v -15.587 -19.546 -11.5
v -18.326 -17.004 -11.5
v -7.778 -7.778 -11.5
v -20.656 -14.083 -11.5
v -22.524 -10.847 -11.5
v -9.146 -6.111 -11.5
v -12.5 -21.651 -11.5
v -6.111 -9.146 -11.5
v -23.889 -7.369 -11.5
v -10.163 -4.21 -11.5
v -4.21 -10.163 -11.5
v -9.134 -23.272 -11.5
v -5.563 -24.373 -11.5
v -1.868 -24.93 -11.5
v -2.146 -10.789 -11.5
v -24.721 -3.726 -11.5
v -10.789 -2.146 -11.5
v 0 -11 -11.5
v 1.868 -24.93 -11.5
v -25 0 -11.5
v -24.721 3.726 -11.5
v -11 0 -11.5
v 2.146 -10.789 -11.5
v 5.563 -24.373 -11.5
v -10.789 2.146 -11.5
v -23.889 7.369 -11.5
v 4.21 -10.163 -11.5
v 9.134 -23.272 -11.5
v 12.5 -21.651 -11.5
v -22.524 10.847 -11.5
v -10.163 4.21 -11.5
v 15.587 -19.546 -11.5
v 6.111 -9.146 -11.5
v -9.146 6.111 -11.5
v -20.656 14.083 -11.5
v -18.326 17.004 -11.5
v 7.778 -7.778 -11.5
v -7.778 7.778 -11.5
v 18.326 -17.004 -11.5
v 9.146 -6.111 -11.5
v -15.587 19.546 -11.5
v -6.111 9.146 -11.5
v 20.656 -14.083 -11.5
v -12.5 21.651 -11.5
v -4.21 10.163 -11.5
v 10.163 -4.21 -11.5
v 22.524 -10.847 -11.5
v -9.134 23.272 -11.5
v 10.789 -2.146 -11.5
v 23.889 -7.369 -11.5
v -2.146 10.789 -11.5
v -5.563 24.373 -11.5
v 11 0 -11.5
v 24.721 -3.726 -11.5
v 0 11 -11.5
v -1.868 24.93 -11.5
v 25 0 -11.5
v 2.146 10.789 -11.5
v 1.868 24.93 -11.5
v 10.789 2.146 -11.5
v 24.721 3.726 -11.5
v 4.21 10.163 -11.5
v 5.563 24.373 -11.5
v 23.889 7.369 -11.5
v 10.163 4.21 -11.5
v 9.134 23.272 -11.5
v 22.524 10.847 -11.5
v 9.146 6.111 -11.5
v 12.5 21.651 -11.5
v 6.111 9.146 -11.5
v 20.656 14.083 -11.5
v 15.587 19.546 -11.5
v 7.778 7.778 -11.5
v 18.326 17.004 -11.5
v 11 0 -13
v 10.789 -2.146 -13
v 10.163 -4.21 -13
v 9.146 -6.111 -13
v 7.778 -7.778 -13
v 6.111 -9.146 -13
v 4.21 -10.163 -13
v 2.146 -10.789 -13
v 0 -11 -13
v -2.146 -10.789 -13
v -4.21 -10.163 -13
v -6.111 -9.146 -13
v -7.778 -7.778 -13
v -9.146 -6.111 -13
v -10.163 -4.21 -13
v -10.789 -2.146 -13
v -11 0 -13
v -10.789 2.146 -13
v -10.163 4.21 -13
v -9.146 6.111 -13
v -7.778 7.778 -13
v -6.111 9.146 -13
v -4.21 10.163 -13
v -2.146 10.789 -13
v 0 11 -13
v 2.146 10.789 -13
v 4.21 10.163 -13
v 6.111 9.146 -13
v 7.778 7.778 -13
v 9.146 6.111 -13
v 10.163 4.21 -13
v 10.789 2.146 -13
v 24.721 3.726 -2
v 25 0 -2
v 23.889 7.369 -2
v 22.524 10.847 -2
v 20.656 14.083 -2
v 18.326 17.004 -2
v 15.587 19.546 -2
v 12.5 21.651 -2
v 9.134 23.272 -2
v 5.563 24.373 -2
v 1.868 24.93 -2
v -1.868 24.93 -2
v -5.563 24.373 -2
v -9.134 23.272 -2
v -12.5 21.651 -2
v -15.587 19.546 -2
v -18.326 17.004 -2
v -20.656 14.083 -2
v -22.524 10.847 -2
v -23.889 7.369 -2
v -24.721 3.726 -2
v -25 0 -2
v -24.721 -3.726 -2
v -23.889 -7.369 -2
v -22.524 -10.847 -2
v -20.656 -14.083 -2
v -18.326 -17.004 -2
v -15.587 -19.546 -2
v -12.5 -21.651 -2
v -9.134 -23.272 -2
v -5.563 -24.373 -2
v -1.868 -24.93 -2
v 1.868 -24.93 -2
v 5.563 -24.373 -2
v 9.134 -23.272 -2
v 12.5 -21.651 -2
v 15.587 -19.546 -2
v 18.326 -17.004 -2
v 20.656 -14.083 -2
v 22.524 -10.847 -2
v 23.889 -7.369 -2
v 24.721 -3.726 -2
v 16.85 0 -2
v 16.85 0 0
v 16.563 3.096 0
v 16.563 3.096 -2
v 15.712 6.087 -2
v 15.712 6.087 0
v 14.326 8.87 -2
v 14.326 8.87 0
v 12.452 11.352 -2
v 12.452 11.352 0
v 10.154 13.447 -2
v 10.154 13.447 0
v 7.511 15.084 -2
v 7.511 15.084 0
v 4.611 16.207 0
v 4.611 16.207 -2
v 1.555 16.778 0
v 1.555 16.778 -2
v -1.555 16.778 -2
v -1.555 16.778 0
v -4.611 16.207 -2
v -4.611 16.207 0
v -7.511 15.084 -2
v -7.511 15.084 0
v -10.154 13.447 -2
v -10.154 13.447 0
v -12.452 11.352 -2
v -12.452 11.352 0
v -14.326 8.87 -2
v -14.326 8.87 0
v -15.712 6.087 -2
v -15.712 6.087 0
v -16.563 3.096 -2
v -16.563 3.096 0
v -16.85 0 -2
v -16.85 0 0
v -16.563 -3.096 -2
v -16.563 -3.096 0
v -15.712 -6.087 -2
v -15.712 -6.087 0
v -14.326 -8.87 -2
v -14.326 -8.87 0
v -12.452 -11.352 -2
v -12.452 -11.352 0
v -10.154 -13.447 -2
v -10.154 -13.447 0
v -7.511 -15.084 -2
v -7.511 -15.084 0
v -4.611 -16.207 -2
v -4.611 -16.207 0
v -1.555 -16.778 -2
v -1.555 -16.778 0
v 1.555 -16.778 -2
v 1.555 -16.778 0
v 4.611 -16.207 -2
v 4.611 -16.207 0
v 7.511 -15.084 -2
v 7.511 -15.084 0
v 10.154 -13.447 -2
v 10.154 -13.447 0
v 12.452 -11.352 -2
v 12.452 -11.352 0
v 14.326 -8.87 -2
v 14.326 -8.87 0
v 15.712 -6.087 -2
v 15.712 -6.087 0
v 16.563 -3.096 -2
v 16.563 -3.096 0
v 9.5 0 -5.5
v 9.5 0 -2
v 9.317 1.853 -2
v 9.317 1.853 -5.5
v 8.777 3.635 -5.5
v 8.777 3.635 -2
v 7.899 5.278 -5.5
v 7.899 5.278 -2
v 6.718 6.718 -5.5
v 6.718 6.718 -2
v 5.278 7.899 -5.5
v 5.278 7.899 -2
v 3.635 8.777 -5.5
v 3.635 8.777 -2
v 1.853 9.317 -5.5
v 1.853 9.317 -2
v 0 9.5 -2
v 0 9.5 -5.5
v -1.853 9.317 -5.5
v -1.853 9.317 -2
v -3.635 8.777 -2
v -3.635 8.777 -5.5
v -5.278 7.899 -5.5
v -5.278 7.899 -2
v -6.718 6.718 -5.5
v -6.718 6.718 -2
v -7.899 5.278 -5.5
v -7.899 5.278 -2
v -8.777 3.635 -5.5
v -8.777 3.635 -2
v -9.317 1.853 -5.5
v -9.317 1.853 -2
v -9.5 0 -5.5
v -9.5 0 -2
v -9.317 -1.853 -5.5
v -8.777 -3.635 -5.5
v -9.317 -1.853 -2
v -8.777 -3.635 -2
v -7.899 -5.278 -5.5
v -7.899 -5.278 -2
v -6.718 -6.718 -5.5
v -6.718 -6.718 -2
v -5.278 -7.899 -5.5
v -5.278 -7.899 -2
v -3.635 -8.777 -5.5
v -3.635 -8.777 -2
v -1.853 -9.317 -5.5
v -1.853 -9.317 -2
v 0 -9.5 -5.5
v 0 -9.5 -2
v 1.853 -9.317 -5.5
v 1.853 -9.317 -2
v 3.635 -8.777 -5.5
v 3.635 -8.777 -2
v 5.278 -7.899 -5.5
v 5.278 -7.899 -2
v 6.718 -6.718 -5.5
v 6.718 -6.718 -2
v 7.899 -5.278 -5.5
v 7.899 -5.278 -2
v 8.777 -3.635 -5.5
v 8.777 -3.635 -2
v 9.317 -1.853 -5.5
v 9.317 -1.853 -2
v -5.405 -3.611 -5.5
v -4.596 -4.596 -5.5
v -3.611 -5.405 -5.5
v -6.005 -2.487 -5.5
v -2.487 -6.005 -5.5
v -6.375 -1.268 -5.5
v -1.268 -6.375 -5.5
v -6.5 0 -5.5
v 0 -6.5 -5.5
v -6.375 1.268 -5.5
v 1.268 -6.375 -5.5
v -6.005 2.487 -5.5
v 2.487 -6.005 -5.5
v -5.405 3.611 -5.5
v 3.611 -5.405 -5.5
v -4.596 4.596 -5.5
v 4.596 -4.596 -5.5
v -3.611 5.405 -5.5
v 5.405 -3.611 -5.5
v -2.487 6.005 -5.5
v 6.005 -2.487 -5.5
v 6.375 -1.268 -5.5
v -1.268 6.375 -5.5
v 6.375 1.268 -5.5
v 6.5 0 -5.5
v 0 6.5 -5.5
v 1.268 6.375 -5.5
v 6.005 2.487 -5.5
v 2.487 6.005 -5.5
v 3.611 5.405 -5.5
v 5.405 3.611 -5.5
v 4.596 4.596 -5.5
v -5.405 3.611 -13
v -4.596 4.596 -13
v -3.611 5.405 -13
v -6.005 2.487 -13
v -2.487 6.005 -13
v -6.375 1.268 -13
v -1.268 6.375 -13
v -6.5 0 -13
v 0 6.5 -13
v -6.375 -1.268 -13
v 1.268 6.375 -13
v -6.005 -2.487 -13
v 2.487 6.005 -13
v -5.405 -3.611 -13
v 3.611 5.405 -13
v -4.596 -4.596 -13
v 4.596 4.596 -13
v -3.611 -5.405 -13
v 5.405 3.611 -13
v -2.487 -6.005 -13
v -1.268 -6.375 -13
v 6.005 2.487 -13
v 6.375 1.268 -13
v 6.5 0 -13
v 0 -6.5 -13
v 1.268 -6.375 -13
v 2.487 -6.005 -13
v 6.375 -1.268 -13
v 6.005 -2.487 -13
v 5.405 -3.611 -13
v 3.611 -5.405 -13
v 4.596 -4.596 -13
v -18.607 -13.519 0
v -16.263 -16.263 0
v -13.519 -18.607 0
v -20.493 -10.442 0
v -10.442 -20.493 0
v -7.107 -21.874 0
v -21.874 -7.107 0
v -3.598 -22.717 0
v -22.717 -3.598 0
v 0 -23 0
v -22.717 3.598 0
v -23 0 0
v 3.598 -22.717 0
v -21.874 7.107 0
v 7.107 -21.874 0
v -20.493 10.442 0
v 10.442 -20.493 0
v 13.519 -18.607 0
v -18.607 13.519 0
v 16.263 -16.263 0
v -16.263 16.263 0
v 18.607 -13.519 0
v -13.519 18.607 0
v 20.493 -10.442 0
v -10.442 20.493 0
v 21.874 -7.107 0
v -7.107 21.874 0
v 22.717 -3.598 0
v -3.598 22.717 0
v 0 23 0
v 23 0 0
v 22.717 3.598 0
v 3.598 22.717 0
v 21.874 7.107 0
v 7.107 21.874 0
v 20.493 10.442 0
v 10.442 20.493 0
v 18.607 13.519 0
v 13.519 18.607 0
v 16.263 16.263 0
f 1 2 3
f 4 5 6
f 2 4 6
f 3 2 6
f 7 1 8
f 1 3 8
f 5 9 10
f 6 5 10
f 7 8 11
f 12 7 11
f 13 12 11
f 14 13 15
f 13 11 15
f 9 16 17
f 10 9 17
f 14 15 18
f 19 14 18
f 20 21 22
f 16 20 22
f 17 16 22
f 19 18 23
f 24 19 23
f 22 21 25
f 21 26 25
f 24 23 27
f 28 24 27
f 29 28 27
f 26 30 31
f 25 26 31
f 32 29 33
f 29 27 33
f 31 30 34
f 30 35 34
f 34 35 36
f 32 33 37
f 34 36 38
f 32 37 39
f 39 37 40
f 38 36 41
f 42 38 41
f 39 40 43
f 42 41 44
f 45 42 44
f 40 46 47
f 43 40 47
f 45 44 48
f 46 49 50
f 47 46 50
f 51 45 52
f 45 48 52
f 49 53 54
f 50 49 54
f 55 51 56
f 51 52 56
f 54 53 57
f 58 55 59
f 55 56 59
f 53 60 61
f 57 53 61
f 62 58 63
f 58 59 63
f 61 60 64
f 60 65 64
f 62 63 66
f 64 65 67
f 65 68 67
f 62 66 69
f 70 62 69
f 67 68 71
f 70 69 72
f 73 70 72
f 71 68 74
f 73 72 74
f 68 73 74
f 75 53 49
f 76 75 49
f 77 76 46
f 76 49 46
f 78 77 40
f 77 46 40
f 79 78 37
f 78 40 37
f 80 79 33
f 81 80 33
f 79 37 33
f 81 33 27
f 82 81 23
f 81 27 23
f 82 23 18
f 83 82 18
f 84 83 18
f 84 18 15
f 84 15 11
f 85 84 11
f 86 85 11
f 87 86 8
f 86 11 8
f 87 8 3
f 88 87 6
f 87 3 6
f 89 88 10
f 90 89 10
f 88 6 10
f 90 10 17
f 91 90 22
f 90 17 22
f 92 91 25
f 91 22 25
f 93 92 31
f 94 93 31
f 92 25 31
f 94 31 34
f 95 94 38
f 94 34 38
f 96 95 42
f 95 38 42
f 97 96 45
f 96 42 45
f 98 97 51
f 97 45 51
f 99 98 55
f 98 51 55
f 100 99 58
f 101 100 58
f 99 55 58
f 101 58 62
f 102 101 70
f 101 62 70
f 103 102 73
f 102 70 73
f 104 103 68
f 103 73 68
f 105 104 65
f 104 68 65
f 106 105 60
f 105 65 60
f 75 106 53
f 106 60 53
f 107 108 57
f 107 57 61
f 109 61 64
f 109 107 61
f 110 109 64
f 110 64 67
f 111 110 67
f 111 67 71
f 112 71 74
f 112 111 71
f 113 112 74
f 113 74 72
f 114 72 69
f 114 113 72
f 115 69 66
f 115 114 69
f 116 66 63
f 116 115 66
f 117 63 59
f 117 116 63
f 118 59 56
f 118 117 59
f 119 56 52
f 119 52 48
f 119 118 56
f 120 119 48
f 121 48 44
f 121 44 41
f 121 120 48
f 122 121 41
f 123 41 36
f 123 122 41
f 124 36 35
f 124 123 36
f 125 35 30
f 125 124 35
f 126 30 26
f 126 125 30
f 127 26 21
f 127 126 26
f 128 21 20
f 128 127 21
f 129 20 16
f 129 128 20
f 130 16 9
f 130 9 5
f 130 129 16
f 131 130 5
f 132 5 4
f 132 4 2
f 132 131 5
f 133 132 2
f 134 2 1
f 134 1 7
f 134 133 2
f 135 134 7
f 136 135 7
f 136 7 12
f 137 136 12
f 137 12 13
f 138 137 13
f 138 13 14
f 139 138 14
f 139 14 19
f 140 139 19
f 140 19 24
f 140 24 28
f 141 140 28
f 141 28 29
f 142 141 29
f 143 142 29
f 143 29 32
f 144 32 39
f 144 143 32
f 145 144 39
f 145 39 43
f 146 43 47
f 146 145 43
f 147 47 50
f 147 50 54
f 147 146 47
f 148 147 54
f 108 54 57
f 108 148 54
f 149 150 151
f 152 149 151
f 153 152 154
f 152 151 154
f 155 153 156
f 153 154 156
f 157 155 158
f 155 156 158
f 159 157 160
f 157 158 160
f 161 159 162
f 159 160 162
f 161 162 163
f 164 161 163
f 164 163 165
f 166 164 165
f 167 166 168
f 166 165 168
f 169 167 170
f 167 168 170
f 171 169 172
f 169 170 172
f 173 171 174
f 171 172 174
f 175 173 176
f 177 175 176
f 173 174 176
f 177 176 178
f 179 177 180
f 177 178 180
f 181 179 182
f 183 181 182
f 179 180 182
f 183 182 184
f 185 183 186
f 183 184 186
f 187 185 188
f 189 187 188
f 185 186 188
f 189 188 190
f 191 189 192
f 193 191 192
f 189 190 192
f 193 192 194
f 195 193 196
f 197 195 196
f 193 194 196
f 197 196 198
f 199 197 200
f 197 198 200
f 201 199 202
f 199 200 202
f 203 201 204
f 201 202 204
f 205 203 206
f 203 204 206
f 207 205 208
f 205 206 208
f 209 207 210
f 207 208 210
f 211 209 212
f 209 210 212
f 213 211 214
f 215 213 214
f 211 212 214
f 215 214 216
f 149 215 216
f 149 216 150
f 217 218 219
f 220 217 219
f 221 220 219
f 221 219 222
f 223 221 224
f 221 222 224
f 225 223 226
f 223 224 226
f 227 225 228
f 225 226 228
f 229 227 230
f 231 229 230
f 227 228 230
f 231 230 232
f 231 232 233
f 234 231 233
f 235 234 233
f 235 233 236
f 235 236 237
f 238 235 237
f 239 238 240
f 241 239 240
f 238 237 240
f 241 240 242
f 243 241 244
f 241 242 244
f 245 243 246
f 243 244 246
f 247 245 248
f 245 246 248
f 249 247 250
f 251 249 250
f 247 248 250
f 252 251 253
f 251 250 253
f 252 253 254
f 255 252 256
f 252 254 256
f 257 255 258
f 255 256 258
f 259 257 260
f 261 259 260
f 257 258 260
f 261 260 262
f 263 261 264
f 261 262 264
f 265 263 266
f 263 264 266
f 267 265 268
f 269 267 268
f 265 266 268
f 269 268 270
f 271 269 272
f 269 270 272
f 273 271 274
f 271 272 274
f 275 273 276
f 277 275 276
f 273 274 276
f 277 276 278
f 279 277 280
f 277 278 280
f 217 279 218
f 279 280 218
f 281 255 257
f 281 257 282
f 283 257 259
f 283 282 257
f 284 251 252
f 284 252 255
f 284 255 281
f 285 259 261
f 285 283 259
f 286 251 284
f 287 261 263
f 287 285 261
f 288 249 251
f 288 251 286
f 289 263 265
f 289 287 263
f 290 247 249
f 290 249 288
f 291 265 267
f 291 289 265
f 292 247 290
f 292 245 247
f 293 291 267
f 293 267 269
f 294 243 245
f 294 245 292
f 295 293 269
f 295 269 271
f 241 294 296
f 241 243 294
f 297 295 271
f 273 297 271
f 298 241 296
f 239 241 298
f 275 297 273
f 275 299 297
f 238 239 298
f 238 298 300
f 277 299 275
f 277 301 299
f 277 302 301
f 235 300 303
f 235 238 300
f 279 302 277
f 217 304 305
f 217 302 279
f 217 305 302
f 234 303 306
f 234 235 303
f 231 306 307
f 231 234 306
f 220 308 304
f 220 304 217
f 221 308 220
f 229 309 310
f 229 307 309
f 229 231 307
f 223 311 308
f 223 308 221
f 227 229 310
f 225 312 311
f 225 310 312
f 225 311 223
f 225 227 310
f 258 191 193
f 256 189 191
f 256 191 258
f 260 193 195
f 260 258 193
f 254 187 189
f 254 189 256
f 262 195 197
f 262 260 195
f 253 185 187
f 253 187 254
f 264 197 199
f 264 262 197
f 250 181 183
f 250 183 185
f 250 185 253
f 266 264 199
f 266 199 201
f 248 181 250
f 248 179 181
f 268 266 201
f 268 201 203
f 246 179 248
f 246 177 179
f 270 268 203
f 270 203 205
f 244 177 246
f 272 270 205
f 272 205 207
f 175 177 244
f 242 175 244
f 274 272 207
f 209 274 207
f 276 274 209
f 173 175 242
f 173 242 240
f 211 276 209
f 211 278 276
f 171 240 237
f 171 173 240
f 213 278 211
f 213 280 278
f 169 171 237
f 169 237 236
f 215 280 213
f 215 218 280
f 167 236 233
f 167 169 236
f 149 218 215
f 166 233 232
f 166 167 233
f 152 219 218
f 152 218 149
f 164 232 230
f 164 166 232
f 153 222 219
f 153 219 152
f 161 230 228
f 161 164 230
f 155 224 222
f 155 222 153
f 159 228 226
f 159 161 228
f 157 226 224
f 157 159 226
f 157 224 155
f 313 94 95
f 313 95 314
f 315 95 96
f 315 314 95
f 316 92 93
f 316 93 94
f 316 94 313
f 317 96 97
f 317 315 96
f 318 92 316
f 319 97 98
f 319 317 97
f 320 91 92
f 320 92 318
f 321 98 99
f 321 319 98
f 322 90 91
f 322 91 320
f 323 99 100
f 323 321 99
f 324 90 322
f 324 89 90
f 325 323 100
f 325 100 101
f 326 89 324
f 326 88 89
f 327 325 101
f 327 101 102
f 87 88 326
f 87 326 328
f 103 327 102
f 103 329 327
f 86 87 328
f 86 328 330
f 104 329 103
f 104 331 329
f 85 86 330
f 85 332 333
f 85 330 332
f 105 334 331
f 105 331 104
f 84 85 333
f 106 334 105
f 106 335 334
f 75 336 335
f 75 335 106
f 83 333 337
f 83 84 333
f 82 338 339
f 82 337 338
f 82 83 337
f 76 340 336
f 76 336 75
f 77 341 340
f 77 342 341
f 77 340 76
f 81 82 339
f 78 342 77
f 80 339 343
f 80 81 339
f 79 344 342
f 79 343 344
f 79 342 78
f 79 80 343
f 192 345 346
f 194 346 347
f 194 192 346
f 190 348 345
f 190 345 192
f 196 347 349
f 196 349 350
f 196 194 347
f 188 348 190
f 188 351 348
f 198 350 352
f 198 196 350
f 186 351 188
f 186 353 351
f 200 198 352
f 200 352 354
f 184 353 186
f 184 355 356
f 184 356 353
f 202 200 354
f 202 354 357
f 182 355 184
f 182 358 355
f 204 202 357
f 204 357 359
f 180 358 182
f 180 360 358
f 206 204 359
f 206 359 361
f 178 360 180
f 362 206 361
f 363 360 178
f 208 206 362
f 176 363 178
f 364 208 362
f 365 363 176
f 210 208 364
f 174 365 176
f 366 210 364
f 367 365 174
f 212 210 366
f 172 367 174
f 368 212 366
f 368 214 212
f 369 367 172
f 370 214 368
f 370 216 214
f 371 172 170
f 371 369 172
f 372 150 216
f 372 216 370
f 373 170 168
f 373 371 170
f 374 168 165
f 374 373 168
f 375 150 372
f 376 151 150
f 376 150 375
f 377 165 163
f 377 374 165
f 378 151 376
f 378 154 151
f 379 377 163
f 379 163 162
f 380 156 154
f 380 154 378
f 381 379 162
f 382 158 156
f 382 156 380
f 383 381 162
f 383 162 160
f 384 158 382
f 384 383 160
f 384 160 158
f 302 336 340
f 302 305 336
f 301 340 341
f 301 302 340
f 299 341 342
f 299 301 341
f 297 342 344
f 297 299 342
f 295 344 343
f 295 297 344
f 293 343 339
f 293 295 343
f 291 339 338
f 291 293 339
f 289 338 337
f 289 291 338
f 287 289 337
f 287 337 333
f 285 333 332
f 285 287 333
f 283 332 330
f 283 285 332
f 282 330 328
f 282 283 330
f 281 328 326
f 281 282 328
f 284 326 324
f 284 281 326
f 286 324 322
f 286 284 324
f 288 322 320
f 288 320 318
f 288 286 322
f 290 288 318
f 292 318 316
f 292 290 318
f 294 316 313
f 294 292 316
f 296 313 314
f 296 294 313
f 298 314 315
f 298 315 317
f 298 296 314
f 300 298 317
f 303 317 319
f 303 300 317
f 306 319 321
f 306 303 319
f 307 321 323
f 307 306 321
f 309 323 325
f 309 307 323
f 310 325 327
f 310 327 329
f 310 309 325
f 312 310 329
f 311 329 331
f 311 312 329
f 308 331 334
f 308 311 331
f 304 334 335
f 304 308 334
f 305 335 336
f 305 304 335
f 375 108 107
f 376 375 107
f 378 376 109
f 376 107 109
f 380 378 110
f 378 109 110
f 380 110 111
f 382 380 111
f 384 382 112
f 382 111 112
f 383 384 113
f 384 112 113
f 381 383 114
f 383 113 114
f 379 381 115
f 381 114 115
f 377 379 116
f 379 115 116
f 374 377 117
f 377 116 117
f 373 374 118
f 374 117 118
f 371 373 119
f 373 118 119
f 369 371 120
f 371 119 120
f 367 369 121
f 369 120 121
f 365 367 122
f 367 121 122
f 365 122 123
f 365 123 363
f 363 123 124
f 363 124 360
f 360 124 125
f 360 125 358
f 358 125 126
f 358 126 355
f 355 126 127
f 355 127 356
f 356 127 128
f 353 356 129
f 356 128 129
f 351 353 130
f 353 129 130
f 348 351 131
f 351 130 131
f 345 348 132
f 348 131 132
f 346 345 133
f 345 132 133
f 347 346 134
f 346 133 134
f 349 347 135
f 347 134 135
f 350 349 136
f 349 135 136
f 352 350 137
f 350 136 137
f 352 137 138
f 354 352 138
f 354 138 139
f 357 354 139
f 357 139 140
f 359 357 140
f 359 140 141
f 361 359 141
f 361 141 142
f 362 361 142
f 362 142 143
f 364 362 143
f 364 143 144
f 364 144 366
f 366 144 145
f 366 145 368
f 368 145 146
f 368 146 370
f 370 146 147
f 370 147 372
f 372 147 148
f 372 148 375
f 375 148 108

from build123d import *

# Parameters (mm, degrees)
CROQUIS1_R              = 25
SALIENTE_EXTRUIR1_DEPTH = 11.5
CROQUIS2_R              = 16.85
CORTAR_EXTRUIR1_DEPTH   = 2
CROQUIS3_R              = 9.5
CORTAR_EXTRUIR2_DEPTH   = 3.5
CORTAR_EXTRUIR3_REACH   = 37.861
CROQUIS4_R              = 6.5
CROQUIS5_R              = 11
CROQUIS5_R_2            = 6.5
SALIENTE_EXTRUIR2_DEPTH = 1.5
CHAFL_N1_SIZE           = 2


with BuildPart() as part:
    # Croquis1 → Saliente-Extruir1 (new body)
    with BuildSketch(Plane.XY):
        Circle(CROQUIS1_R)
    extrude(amount=-SALIENTE_EXTRUIR1_DEPTH)

    # Croquis2 → Cortar-Extruir1 (cut)
    with BuildSketch(Plane.XY):
        Circle(CROQUIS2_R)
    extrude(amount=-CORTAR_EXTRUIR1_DEPTH, mode=Mode.SUBTRACT)

    # Croquis3 → Cortar-Extruir2 (cut)
    with BuildSketch(Plane.XY.offset(-2)):
        Circle(CROQUIS3_R)
    extrude(amount=-CORTAR_EXTRUIR2_DEPTH, mode=Mode.SUBTRACT)

    # Croquis4 → Cortar-Extruir3 (cut, up to next)
    with BuildSketch(Plane.XY.offset(-5.5), mode=Mode.PRIVATE) as cortar_extruir3_sk1:
        Circle(CROQUIS4_R)
    cortar_extruir3_tool1 = extrude(cortar_extruir3_sk1.sketch, amount=-CORTAR_EXTRUIR3_REACH, mode=Mode.PRIVATE) & part.part
    add(cortar_extruir3_tool1.solids().sort_by_distance((0, 0, -5.5))[0], mode=Mode.SUBTRACT)

    # Croquis5 → Saliente-Extruir2 (add)
    with BuildSketch(Plane(origin=(0, 0, -11.5), x_dir=(-1, 0, 0), z_dir=(0, 0, -1))):
        with Locations(Location((0, 0, 0), (0, 0, 180))):
            Circle(CROQUIS5_R)
        with Locations(Location((0, 0, 0), (0, 0, 180))):
            Circle(CROQUIS5_R_2, mode=Mode.SUBTRACT)
    extrude(amount=SALIENTE_EXTRUIR2_DEPTH)

    # Chaflán1
    chafl_n1_edges = [part.edges().sort_by_distance(p)[0] for p in [
        (-25, 0, 0),
    ]]
    chamfer(chafl_n1_edges, length=CHAFL_N1_SIZE)


solid = part.part
